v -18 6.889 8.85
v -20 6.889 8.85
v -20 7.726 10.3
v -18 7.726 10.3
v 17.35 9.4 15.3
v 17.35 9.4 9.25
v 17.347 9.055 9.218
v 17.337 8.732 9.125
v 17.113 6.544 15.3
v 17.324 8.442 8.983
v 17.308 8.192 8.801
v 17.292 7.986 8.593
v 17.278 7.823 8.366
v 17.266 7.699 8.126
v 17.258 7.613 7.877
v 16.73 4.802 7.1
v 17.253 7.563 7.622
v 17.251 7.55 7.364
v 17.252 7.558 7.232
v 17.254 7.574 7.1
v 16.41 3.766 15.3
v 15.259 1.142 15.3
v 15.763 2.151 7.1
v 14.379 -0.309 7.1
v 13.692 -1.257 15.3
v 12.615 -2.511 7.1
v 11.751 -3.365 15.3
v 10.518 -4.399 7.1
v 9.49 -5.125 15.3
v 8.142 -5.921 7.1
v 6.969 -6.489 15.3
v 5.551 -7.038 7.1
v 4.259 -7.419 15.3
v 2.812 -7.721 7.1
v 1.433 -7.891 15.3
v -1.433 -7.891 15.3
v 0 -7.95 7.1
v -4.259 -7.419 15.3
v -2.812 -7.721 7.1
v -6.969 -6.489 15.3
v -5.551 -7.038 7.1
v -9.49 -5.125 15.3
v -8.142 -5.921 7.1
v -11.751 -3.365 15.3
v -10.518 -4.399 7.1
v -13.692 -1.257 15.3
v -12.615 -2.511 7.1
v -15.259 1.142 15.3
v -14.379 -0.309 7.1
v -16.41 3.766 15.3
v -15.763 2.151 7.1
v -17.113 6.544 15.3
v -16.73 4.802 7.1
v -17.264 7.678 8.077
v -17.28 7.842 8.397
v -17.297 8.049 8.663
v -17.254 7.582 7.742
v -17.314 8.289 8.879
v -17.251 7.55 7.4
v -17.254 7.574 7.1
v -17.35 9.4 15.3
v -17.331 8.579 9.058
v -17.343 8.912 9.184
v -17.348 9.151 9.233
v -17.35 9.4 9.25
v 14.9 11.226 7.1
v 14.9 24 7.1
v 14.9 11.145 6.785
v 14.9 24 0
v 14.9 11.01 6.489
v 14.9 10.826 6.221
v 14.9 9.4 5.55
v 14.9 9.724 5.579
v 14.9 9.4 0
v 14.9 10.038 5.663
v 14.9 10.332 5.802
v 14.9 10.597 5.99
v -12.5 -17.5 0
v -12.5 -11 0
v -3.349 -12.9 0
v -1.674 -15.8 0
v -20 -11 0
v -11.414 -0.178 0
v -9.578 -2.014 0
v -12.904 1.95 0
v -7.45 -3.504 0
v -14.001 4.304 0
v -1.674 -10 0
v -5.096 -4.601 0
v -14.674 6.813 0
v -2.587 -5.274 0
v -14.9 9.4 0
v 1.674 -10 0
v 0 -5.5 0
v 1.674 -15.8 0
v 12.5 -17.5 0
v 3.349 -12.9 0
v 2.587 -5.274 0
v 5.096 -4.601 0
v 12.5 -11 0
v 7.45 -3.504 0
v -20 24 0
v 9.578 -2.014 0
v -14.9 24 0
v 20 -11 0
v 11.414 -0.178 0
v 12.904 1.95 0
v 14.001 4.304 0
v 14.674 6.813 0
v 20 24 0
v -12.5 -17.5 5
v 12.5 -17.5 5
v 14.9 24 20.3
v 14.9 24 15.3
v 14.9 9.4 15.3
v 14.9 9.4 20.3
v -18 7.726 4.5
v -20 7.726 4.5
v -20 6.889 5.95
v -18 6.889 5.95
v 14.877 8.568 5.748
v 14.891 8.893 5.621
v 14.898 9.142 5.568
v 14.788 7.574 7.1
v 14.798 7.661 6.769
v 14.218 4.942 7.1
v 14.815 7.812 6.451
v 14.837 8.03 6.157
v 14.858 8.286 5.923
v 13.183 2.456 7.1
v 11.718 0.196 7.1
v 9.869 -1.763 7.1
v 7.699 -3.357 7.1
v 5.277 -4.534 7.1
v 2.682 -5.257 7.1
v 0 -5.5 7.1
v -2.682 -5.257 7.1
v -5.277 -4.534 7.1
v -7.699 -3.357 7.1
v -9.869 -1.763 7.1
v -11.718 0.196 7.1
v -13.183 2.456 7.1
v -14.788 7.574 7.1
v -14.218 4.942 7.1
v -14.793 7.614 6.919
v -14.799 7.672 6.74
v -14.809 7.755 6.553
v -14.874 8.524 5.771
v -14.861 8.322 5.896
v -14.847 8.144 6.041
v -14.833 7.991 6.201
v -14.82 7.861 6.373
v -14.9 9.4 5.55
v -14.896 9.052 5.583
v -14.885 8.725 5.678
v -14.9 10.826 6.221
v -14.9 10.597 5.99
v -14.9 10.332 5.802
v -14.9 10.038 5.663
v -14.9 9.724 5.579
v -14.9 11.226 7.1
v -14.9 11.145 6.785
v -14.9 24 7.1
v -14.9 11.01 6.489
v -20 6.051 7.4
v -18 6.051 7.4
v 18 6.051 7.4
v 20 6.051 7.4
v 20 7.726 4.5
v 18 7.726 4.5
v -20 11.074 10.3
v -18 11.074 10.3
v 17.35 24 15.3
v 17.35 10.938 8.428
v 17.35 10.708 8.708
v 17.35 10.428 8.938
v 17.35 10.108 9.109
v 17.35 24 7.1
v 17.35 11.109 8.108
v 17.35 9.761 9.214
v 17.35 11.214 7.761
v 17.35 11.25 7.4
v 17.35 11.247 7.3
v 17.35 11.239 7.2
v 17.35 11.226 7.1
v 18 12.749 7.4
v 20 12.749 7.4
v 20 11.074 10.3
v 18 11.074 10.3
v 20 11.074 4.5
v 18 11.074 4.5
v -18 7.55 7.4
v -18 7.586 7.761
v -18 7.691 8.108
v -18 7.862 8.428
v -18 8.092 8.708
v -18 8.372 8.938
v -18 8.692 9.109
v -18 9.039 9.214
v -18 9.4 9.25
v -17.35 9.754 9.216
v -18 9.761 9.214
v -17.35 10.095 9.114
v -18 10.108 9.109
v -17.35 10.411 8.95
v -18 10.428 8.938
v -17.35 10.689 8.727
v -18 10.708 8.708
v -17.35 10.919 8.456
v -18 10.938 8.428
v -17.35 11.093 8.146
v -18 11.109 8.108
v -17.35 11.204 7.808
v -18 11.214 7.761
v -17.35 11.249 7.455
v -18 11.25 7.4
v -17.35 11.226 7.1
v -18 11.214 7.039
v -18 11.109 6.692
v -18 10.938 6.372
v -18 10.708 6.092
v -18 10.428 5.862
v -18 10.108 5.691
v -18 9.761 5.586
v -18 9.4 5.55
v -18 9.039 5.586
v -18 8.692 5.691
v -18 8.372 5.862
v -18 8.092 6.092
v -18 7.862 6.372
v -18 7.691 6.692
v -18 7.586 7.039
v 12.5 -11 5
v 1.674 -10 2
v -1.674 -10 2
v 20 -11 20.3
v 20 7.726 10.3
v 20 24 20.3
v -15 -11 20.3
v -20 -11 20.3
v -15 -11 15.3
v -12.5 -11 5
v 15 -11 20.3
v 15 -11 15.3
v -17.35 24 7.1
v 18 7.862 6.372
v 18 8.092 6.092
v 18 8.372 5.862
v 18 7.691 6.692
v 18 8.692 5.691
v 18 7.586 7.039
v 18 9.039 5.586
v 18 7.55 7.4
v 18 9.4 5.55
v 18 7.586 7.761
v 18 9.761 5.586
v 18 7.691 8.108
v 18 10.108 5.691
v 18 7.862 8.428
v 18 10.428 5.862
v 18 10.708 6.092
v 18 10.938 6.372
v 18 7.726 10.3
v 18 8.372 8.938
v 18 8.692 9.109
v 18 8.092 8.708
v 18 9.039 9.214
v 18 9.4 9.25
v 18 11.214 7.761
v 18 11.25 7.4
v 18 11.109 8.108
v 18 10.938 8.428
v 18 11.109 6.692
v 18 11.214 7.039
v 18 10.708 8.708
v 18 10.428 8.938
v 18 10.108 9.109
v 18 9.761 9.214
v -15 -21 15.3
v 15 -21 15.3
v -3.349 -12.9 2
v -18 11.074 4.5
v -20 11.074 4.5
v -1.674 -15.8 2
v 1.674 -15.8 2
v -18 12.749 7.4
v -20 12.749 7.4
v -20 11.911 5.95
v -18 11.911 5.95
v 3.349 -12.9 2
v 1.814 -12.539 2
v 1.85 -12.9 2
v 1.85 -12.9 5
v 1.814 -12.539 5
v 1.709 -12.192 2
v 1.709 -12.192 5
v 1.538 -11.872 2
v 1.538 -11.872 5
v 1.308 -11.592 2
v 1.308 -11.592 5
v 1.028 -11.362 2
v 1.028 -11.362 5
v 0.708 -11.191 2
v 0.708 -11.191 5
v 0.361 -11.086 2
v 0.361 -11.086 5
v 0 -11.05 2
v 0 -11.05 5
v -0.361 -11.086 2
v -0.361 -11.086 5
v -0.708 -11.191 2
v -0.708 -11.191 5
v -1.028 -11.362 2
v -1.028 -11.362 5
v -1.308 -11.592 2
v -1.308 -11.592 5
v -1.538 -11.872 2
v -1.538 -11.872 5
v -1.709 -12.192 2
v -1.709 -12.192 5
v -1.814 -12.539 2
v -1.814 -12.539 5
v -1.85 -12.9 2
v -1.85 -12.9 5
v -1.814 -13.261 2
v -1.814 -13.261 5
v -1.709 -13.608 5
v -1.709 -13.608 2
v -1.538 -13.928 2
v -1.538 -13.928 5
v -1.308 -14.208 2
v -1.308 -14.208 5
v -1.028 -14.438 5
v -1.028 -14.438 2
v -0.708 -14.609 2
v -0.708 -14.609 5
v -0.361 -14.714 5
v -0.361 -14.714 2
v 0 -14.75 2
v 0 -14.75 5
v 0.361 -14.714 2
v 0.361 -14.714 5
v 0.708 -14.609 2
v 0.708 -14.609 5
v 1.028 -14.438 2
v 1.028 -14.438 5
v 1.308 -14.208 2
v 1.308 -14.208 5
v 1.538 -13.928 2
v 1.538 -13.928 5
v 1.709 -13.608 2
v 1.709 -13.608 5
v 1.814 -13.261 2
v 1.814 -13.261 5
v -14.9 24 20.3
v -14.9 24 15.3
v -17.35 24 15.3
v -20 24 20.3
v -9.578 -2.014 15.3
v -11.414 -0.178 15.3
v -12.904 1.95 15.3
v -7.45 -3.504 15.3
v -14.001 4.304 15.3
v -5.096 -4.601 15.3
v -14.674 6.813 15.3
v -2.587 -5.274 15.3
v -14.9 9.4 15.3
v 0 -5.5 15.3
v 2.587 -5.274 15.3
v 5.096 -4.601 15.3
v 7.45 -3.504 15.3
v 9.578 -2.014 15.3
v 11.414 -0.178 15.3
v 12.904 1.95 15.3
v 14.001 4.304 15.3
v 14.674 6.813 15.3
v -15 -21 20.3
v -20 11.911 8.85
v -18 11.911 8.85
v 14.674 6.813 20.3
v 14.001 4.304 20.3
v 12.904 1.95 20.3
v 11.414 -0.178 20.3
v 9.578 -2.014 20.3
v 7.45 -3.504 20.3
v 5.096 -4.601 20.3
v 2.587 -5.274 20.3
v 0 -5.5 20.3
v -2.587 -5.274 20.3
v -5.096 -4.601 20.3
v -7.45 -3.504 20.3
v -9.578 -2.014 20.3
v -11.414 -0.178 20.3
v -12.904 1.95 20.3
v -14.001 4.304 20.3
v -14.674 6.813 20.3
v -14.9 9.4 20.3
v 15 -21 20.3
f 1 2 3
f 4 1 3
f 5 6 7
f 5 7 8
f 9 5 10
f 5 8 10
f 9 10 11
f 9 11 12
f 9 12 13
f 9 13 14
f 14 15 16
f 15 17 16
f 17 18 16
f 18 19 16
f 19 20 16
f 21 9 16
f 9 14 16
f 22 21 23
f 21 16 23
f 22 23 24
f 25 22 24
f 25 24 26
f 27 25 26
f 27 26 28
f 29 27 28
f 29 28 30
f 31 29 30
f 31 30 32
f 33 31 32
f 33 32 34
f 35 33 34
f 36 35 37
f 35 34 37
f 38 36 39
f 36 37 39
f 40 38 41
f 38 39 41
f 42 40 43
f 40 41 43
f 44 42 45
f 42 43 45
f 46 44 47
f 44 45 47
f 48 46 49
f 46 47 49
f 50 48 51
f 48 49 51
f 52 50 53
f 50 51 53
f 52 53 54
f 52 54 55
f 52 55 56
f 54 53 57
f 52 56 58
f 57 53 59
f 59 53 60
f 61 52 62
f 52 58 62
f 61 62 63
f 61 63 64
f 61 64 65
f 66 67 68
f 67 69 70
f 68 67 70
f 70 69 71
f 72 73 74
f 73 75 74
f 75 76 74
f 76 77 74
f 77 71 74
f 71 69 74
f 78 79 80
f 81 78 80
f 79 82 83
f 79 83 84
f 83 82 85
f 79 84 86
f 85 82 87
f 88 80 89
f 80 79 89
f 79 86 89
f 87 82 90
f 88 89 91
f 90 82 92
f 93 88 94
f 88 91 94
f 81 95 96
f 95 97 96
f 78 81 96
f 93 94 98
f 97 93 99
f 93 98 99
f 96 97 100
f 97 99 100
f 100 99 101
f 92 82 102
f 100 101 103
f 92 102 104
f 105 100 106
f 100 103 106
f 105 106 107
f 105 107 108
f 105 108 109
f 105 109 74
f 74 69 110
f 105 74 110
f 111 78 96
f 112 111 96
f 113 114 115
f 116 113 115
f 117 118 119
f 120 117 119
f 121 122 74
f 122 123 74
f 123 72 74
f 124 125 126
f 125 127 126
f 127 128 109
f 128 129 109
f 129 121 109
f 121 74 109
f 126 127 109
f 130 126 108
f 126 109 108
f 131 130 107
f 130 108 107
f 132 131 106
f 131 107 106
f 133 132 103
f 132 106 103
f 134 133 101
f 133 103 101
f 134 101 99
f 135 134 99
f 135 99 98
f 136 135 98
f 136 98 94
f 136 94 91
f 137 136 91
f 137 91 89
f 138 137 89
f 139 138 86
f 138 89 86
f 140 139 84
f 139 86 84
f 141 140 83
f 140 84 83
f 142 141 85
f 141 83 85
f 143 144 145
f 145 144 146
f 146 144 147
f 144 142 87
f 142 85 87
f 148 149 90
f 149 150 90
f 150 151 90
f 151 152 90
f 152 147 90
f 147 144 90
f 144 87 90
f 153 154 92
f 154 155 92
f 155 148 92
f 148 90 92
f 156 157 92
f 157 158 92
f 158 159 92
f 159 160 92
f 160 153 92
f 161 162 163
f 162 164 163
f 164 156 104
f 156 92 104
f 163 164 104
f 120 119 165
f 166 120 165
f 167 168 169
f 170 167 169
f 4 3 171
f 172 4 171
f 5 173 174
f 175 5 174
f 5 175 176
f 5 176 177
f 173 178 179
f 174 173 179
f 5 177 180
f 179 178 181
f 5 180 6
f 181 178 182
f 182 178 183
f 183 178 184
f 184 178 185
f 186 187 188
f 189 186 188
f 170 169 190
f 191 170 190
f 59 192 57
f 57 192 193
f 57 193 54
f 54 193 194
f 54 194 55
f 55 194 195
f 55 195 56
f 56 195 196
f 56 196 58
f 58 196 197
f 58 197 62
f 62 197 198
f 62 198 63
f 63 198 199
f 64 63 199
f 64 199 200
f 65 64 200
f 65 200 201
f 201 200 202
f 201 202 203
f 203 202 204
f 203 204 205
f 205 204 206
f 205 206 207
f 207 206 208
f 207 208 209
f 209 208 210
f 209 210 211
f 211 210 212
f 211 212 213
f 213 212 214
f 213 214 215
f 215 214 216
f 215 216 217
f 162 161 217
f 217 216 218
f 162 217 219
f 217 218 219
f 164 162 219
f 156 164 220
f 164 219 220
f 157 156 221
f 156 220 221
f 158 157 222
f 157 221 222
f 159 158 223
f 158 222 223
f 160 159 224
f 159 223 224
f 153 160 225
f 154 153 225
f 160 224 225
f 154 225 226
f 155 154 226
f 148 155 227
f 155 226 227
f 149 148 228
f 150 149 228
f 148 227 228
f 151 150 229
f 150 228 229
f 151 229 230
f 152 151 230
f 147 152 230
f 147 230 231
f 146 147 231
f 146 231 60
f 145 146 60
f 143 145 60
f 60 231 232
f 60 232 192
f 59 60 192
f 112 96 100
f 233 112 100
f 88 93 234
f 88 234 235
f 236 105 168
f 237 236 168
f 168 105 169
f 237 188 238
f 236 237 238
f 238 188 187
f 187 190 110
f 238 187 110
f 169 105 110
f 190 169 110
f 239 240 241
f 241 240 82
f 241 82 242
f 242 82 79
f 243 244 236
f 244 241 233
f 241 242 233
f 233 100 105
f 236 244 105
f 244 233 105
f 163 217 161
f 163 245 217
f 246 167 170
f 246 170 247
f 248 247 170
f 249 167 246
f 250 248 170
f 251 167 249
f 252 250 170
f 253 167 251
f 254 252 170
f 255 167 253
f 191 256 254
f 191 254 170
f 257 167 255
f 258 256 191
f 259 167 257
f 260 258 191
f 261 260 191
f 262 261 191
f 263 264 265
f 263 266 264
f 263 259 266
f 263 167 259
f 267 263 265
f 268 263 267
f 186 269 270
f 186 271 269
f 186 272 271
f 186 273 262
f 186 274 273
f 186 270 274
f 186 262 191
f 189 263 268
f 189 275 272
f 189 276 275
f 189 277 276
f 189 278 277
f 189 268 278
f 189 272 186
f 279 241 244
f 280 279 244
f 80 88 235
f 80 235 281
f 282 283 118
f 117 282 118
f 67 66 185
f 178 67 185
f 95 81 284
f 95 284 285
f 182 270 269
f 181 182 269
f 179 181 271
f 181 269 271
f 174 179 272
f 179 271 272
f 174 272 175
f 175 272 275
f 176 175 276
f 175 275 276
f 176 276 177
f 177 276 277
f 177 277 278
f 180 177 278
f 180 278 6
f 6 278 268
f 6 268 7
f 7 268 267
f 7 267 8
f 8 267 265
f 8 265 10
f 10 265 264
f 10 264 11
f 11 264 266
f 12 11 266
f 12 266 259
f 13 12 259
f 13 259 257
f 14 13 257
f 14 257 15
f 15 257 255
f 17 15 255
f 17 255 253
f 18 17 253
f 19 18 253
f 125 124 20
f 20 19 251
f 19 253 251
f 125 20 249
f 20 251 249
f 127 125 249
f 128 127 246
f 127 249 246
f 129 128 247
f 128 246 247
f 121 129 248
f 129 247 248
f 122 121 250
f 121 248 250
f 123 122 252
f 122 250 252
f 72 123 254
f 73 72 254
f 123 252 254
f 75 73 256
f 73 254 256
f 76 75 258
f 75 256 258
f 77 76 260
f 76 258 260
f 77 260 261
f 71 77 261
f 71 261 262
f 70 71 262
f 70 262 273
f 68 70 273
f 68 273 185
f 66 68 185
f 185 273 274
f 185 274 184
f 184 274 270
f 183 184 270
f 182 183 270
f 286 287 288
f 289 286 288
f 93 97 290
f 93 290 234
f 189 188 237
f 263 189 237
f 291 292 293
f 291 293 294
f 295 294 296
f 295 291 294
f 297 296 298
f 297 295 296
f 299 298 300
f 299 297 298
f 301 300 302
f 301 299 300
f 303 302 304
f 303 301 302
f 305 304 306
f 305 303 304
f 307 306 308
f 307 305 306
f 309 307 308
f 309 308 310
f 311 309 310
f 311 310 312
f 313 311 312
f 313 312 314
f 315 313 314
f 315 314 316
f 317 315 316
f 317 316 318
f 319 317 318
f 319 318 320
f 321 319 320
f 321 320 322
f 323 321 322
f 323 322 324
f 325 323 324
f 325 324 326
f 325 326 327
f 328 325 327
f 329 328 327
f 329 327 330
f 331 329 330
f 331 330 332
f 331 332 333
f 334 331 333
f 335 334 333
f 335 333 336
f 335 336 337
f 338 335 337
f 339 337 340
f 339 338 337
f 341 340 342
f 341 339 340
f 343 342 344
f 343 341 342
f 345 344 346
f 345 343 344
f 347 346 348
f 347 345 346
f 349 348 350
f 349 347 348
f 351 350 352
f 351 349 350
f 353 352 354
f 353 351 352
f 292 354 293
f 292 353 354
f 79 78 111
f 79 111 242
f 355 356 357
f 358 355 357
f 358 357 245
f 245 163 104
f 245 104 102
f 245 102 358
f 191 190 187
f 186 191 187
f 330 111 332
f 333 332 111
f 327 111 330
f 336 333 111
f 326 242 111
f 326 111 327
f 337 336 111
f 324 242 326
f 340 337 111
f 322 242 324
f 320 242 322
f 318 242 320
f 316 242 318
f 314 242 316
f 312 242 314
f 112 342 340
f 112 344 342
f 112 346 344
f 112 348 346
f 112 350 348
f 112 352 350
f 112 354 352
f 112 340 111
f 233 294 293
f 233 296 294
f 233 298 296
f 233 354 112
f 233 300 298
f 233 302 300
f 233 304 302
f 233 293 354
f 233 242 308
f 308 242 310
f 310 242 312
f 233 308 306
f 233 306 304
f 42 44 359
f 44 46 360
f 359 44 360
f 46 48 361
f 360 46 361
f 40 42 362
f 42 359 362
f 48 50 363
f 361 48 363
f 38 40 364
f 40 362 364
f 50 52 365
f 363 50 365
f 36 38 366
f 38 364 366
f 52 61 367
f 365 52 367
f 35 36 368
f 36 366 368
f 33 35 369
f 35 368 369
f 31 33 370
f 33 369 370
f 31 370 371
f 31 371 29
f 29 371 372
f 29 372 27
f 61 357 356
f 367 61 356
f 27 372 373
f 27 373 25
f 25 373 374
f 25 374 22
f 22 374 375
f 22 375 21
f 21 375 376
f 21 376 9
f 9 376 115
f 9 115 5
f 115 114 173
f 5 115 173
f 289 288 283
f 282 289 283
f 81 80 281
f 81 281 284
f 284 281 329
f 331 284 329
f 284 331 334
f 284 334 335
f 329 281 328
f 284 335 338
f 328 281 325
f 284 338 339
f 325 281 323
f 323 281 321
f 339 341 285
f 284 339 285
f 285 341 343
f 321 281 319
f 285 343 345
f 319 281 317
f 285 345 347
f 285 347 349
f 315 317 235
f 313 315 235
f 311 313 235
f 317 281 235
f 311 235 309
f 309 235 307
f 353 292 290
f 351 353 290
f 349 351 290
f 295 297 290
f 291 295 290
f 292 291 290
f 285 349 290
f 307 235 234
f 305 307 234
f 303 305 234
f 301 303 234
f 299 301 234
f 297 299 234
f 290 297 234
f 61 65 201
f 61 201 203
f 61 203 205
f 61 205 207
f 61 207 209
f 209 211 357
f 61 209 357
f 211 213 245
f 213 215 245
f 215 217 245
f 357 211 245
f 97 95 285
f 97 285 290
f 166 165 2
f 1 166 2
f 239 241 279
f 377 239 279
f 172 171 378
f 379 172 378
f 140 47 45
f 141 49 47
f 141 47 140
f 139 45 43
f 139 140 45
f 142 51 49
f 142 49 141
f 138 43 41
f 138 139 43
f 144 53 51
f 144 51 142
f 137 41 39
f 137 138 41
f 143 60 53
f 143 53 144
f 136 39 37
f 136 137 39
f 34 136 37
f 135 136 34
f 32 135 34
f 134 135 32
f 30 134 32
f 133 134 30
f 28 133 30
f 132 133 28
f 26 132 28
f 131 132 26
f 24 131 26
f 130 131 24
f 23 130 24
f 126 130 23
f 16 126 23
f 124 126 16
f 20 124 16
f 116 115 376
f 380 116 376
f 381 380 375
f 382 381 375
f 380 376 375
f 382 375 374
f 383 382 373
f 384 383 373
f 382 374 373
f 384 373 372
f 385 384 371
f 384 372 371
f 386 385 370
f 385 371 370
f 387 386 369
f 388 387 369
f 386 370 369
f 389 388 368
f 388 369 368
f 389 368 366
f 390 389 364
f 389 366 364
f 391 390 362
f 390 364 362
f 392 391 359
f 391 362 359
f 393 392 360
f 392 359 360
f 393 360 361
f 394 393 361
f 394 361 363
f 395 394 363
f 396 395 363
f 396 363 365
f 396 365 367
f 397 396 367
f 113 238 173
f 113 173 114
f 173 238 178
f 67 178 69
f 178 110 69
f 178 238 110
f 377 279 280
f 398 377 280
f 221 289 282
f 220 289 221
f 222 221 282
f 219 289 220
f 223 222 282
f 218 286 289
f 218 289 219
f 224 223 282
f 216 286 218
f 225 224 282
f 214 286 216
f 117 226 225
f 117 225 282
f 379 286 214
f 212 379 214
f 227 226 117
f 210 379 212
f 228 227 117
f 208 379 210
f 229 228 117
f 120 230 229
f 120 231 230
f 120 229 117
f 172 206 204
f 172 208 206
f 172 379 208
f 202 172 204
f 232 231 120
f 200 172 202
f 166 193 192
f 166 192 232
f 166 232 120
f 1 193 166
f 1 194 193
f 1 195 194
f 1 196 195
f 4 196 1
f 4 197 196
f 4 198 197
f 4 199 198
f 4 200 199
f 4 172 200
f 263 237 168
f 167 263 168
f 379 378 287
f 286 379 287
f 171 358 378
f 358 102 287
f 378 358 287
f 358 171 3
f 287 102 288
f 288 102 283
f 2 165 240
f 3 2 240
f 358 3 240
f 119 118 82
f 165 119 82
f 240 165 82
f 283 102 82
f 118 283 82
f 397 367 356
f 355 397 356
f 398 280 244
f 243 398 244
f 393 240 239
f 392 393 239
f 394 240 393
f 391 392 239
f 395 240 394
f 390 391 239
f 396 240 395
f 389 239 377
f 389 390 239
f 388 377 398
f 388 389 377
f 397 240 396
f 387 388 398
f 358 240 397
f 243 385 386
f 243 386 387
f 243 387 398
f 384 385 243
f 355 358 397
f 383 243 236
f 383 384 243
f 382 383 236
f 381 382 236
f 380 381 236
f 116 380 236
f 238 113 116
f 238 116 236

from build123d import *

# Parameters (mm, degrees)
F0_W      = 25
F0_H      = 6.5
F0_R      = 1.85
F1_DEPTH  = 5
F3_DEPTH  = 2.1
F5_DEPTH  = 8.2
F7_DEPTH  = 5
F9_DEPTH  = 2
F11_DEPTH = 2
F12_R     = 1.85
F13_DEPTH = 5
F14_R     = 1.85
F15_DEPTH = 5
F17_DEPTH = 2


# Not quite as in the source:
# - a feature names something its author has since deleted; it is built from what else it names


with BuildPart() as f1:
    # F0 (on Top) → F1 (new body)
    with BuildSketch(Plane.XY):
        with BuildLine():
            Line((-14.9, 24), (-20, 24))
            Line((-20, 24), (-20, -11))
            Line((-20, -11), (-12.5, -11))
            Line((-12.5, -11), (12.5, -11))
            Line((12.5, -11), (20, -11))
            Line((20, -11), (20, 24))
            Line((20, 24), (14.9, 24))
            Line((14.9, 24), (14.9, 9.4))
            ThreePointArc((14.9, 9.4), (0, -5.5), (-14.9, 9.4))
            Line((-14.9, 9.4), (-14.9, 24))
        make_face()
        with Locations((0, -14.25)):
            Rectangle(F0_W, F0_H)
        with Locations((0, -12.9)):
            Circle(F0_R, mode=Mode.SUBTRACT)
    extrude(amount=F1_DEPTH)

    # F2 (on face) → F3 (join)
    with BuildSketch(Plane.XY.offset(5)):
        with BuildLine():
            Line((-14.9, 24), (-20, 24))
            Line((-20, 24), (-20, -11))
            Line((-20, -11), (20, -11))
            Line((20, -11), (20, 24))
            Line((20, 24), (14.9, 24))
            Line((14.9, 24), (14.9, 9.4))
            ThreePointArc((14.9, 9.4), (0, -5.5), (-14.9, 9.4))
            Line((-14.9, 9.4), (-14.9, 24))
        make_face()
    extrude(amount=F3_DEPTH)

    # F4 (on face) → F5 (join)
    with BuildSketch(Plane.XY.offset(7.1)):
        with BuildLine():
            Line((-17.35, 24), (-20, 24))
            Line((-20, 24), (-20, -11))
            Line((-20, -11), (20, -11))
            Line((20, -11), (20, 24))
            Line((20, 24), (17.35, 24))
            Line((17.35, 24), (17.35, 9.4))
            ThreePointArc((17.35, 9.4), (0, -7.95), (-17.35, 9.4))
            Line((-17.35, 9.4), (-17.35, 24))
        make_face()
    extrude(amount=F5_DEPTH)

    # F6 (on face) → F7 (join)
    with BuildSketch(Plane.XY.offset(15.3)):
        with BuildLine():
            Line((-14.9, 24), (-20, 24))
            Line((-20, 24), (-20, -11))
            Line((-20, -11), (-15, -11))
            Line((-15, -11), (-15, -21))
            Line((-15, -21), (15, -21))
            Line((15, -21), (15, -11))
            Line((15, -11), (20, -11))
            Line((20, -11), (20, 24))
            Line((20, 24), (14.9, 24))
            Line((14.9, 24), (14.9, 9.4))
            ThreePointArc((14.9, 9.4), (0, -5.5), (-14.9, 9.4))
            Line((-14.9, 9.4), (-14.9, 24))
        make_face()
    extrude(amount=F7_DEPTH)

    # F8 (on face) → F9 (cut)
    with BuildSketch(Plane(origin=(-20, 0, 0), x_dir=(0, -1, 0), z_dir=(-1, 0, 0))):
        with BuildLine():
            ThreePointArc((-6.8885265259, 5.9499996589), (-6.5988151547, 6.649424579), (-6.5, 7.4))
            ThreePointArc((-6.5, 7.4), (-6.598815139, 8.1505753623), (-6.8885264651, 8.8500002357))
            ThreePointArc((-6.8885264651, 8.8500002357), (-7.9500001179, 9.911473739), (-9.4, 10.3))
            ThreePointArc((-9.4, 10.3), (-10.849999907, 9.9114737247), (-11.9114735636, 8.850000186))
            ThreePointArc((-11.9114735636, 8.850000186), (-12.3, 7.3999999856), (-11.9114735492, 5.9499997892))
            ThreePointArc((-11.9114735492, 5.9499997892), (-10.8499998946, 4.8885262682), (-9.4, 4.5))
            ThreePointArc((-9.4, 4.5), (-7.9500001705, 4.8885262306), (-6.8885265259, 5.9499996589))
        make_face()
        with BuildLine():
            ThreePointArc((-6.8885264651, 8.8500002357), (-6.598815139, 8.1505753623), (-6.5, 7.4))
            ThreePointArc((-6.5, 7.4), (-6.5988151547, 6.649424579), (-6.8885265259, 5.9499996589))
            Line((-6.8885265259, 5.9499996589), (-6.0513684387, 7.4))
            Line((-6.0513684387, 7.4), (-6.8885264651, 8.8500002357))
        make_face()
        with BuildLine():
            ThreePointArc((-9.4, 10.3), (-7.9500001179, 9.911473739), (-6.8885264651, 8.8500002357))
            Line((-6.8885264651, 8.8500002357), (-7.7256842194, 10.3))
            Line((-7.7256842194, 10.3), (-9.4, 10.3))
        make_face()
        with BuildLine():
            Line((-7.7256842194, 4.5), (-6.8885265259, 5.9499996589))
            ThreePointArc((-6.8885265259, 5.9499996589), (-7.9500001705, 4.8885262306), (-9.4, 4.5))
            Line((-9.4, 4.5), (-7.7256842194, 4.5))
        make_face()
        with BuildLine():
            ThreePointArc((-11.9114735636, 8.850000186), (-10.849999907, 9.9114737247), (-9.4, 10.3))
            Line((-9.4, 10.3), (-11.0743157806, 10.3))
            Line((-11.0743157806, 10.3), (-11.9114735636, 8.850000186))
        make_face()
        with BuildLine():
            Line((-11.0743157806, 4.5), (-9.4, 4.5))
            ThreePointArc((-9.4, 4.5), (-10.8499998946, 4.8885262682), (-11.9114735492, 5.9499997892))
            Line((-11.9114735492, 5.9499997892), (-11.0743157806, 4.5))
        make_face()
        with BuildLine():
            ThreePointArc((-11.9114735492, 5.9499997892), (-12.3, 7.3999999856), (-11.9114735636, 8.850000186))
            Line((-11.9114735636, 8.850000186), (-12.7486315613, 7.4))
            Line((-12.7486315613, 7.4), (-11.9114735492, 5.9499997892))
        make_face()
    extrude(amount=-F9_DEPTH, mode=Mode.SUBTRACT)

    # F10 (on face) → F11 (cut)
    with BuildSketch(Plane.YZ.offset(20)):
        Polygon((11.0743157806, 10.3), (7.7256842194, 10.3), (6.0513684387, 7.4), (7.7256842194, 4.5), (11.0743157806, 4.5), (12.7486315613, 7.4), align=None)
    extrude(amount=-F11_DEPTH, mode=Mode.SUBTRACT)

    # F12 (on face) → F13 (cut)
    with BuildSketch(Plane.YZ.offset(18)):
        with Locations((9.4, 7.4)):
            Circle(F12_R)
    extrude(amount=-F13_DEPTH, mode=Mode.SUBTRACT)

    # F14 (on face) → F15 (cut)
    with BuildSketch(Plane(origin=(-18, 0, 0), x_dir=(0, -1, 0), z_dir=(-1, 0, 0))):
        with Locations((-9.4, 7.4)):
            Circle(F14_R)
    extrude(amount=-F15_DEPTH, mode=Mode.SUBTRACT)

    # F16 (on Top) → F17 (cut)
    with BuildSketch(Plane.XY):
        Polygon((-1.6743157806, -15.8), (1.6743157806, -15.8), (3.3486315613, -12.9), (1.6743157806, -10), (-1.6743157806, -10), (-3.3486315613, -12.9), align=None)
    extrude(amount=F17_DEPTH, mode=Mode.SUBTRACT)


solid = f1.part
